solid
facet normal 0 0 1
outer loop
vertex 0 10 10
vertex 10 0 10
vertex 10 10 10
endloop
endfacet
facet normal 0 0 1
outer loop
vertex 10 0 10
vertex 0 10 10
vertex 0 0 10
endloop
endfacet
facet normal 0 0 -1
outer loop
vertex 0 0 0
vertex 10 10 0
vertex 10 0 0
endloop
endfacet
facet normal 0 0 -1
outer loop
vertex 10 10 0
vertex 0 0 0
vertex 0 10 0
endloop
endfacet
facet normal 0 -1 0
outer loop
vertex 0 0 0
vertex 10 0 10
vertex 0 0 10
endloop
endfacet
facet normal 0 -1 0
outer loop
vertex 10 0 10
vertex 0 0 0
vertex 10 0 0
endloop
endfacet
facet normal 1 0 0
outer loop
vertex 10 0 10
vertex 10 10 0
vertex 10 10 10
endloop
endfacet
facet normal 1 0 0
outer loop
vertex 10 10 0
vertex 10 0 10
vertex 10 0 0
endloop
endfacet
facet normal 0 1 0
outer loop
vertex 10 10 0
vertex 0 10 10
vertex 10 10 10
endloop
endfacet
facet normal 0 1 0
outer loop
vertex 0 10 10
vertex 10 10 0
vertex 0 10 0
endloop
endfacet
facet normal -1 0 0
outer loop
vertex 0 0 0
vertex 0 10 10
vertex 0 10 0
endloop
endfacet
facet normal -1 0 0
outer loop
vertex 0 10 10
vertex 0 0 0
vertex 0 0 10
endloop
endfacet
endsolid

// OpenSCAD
// tests/fixtures/simple_model.scad
// Simple SCAD file for testing
cube(size=10);
